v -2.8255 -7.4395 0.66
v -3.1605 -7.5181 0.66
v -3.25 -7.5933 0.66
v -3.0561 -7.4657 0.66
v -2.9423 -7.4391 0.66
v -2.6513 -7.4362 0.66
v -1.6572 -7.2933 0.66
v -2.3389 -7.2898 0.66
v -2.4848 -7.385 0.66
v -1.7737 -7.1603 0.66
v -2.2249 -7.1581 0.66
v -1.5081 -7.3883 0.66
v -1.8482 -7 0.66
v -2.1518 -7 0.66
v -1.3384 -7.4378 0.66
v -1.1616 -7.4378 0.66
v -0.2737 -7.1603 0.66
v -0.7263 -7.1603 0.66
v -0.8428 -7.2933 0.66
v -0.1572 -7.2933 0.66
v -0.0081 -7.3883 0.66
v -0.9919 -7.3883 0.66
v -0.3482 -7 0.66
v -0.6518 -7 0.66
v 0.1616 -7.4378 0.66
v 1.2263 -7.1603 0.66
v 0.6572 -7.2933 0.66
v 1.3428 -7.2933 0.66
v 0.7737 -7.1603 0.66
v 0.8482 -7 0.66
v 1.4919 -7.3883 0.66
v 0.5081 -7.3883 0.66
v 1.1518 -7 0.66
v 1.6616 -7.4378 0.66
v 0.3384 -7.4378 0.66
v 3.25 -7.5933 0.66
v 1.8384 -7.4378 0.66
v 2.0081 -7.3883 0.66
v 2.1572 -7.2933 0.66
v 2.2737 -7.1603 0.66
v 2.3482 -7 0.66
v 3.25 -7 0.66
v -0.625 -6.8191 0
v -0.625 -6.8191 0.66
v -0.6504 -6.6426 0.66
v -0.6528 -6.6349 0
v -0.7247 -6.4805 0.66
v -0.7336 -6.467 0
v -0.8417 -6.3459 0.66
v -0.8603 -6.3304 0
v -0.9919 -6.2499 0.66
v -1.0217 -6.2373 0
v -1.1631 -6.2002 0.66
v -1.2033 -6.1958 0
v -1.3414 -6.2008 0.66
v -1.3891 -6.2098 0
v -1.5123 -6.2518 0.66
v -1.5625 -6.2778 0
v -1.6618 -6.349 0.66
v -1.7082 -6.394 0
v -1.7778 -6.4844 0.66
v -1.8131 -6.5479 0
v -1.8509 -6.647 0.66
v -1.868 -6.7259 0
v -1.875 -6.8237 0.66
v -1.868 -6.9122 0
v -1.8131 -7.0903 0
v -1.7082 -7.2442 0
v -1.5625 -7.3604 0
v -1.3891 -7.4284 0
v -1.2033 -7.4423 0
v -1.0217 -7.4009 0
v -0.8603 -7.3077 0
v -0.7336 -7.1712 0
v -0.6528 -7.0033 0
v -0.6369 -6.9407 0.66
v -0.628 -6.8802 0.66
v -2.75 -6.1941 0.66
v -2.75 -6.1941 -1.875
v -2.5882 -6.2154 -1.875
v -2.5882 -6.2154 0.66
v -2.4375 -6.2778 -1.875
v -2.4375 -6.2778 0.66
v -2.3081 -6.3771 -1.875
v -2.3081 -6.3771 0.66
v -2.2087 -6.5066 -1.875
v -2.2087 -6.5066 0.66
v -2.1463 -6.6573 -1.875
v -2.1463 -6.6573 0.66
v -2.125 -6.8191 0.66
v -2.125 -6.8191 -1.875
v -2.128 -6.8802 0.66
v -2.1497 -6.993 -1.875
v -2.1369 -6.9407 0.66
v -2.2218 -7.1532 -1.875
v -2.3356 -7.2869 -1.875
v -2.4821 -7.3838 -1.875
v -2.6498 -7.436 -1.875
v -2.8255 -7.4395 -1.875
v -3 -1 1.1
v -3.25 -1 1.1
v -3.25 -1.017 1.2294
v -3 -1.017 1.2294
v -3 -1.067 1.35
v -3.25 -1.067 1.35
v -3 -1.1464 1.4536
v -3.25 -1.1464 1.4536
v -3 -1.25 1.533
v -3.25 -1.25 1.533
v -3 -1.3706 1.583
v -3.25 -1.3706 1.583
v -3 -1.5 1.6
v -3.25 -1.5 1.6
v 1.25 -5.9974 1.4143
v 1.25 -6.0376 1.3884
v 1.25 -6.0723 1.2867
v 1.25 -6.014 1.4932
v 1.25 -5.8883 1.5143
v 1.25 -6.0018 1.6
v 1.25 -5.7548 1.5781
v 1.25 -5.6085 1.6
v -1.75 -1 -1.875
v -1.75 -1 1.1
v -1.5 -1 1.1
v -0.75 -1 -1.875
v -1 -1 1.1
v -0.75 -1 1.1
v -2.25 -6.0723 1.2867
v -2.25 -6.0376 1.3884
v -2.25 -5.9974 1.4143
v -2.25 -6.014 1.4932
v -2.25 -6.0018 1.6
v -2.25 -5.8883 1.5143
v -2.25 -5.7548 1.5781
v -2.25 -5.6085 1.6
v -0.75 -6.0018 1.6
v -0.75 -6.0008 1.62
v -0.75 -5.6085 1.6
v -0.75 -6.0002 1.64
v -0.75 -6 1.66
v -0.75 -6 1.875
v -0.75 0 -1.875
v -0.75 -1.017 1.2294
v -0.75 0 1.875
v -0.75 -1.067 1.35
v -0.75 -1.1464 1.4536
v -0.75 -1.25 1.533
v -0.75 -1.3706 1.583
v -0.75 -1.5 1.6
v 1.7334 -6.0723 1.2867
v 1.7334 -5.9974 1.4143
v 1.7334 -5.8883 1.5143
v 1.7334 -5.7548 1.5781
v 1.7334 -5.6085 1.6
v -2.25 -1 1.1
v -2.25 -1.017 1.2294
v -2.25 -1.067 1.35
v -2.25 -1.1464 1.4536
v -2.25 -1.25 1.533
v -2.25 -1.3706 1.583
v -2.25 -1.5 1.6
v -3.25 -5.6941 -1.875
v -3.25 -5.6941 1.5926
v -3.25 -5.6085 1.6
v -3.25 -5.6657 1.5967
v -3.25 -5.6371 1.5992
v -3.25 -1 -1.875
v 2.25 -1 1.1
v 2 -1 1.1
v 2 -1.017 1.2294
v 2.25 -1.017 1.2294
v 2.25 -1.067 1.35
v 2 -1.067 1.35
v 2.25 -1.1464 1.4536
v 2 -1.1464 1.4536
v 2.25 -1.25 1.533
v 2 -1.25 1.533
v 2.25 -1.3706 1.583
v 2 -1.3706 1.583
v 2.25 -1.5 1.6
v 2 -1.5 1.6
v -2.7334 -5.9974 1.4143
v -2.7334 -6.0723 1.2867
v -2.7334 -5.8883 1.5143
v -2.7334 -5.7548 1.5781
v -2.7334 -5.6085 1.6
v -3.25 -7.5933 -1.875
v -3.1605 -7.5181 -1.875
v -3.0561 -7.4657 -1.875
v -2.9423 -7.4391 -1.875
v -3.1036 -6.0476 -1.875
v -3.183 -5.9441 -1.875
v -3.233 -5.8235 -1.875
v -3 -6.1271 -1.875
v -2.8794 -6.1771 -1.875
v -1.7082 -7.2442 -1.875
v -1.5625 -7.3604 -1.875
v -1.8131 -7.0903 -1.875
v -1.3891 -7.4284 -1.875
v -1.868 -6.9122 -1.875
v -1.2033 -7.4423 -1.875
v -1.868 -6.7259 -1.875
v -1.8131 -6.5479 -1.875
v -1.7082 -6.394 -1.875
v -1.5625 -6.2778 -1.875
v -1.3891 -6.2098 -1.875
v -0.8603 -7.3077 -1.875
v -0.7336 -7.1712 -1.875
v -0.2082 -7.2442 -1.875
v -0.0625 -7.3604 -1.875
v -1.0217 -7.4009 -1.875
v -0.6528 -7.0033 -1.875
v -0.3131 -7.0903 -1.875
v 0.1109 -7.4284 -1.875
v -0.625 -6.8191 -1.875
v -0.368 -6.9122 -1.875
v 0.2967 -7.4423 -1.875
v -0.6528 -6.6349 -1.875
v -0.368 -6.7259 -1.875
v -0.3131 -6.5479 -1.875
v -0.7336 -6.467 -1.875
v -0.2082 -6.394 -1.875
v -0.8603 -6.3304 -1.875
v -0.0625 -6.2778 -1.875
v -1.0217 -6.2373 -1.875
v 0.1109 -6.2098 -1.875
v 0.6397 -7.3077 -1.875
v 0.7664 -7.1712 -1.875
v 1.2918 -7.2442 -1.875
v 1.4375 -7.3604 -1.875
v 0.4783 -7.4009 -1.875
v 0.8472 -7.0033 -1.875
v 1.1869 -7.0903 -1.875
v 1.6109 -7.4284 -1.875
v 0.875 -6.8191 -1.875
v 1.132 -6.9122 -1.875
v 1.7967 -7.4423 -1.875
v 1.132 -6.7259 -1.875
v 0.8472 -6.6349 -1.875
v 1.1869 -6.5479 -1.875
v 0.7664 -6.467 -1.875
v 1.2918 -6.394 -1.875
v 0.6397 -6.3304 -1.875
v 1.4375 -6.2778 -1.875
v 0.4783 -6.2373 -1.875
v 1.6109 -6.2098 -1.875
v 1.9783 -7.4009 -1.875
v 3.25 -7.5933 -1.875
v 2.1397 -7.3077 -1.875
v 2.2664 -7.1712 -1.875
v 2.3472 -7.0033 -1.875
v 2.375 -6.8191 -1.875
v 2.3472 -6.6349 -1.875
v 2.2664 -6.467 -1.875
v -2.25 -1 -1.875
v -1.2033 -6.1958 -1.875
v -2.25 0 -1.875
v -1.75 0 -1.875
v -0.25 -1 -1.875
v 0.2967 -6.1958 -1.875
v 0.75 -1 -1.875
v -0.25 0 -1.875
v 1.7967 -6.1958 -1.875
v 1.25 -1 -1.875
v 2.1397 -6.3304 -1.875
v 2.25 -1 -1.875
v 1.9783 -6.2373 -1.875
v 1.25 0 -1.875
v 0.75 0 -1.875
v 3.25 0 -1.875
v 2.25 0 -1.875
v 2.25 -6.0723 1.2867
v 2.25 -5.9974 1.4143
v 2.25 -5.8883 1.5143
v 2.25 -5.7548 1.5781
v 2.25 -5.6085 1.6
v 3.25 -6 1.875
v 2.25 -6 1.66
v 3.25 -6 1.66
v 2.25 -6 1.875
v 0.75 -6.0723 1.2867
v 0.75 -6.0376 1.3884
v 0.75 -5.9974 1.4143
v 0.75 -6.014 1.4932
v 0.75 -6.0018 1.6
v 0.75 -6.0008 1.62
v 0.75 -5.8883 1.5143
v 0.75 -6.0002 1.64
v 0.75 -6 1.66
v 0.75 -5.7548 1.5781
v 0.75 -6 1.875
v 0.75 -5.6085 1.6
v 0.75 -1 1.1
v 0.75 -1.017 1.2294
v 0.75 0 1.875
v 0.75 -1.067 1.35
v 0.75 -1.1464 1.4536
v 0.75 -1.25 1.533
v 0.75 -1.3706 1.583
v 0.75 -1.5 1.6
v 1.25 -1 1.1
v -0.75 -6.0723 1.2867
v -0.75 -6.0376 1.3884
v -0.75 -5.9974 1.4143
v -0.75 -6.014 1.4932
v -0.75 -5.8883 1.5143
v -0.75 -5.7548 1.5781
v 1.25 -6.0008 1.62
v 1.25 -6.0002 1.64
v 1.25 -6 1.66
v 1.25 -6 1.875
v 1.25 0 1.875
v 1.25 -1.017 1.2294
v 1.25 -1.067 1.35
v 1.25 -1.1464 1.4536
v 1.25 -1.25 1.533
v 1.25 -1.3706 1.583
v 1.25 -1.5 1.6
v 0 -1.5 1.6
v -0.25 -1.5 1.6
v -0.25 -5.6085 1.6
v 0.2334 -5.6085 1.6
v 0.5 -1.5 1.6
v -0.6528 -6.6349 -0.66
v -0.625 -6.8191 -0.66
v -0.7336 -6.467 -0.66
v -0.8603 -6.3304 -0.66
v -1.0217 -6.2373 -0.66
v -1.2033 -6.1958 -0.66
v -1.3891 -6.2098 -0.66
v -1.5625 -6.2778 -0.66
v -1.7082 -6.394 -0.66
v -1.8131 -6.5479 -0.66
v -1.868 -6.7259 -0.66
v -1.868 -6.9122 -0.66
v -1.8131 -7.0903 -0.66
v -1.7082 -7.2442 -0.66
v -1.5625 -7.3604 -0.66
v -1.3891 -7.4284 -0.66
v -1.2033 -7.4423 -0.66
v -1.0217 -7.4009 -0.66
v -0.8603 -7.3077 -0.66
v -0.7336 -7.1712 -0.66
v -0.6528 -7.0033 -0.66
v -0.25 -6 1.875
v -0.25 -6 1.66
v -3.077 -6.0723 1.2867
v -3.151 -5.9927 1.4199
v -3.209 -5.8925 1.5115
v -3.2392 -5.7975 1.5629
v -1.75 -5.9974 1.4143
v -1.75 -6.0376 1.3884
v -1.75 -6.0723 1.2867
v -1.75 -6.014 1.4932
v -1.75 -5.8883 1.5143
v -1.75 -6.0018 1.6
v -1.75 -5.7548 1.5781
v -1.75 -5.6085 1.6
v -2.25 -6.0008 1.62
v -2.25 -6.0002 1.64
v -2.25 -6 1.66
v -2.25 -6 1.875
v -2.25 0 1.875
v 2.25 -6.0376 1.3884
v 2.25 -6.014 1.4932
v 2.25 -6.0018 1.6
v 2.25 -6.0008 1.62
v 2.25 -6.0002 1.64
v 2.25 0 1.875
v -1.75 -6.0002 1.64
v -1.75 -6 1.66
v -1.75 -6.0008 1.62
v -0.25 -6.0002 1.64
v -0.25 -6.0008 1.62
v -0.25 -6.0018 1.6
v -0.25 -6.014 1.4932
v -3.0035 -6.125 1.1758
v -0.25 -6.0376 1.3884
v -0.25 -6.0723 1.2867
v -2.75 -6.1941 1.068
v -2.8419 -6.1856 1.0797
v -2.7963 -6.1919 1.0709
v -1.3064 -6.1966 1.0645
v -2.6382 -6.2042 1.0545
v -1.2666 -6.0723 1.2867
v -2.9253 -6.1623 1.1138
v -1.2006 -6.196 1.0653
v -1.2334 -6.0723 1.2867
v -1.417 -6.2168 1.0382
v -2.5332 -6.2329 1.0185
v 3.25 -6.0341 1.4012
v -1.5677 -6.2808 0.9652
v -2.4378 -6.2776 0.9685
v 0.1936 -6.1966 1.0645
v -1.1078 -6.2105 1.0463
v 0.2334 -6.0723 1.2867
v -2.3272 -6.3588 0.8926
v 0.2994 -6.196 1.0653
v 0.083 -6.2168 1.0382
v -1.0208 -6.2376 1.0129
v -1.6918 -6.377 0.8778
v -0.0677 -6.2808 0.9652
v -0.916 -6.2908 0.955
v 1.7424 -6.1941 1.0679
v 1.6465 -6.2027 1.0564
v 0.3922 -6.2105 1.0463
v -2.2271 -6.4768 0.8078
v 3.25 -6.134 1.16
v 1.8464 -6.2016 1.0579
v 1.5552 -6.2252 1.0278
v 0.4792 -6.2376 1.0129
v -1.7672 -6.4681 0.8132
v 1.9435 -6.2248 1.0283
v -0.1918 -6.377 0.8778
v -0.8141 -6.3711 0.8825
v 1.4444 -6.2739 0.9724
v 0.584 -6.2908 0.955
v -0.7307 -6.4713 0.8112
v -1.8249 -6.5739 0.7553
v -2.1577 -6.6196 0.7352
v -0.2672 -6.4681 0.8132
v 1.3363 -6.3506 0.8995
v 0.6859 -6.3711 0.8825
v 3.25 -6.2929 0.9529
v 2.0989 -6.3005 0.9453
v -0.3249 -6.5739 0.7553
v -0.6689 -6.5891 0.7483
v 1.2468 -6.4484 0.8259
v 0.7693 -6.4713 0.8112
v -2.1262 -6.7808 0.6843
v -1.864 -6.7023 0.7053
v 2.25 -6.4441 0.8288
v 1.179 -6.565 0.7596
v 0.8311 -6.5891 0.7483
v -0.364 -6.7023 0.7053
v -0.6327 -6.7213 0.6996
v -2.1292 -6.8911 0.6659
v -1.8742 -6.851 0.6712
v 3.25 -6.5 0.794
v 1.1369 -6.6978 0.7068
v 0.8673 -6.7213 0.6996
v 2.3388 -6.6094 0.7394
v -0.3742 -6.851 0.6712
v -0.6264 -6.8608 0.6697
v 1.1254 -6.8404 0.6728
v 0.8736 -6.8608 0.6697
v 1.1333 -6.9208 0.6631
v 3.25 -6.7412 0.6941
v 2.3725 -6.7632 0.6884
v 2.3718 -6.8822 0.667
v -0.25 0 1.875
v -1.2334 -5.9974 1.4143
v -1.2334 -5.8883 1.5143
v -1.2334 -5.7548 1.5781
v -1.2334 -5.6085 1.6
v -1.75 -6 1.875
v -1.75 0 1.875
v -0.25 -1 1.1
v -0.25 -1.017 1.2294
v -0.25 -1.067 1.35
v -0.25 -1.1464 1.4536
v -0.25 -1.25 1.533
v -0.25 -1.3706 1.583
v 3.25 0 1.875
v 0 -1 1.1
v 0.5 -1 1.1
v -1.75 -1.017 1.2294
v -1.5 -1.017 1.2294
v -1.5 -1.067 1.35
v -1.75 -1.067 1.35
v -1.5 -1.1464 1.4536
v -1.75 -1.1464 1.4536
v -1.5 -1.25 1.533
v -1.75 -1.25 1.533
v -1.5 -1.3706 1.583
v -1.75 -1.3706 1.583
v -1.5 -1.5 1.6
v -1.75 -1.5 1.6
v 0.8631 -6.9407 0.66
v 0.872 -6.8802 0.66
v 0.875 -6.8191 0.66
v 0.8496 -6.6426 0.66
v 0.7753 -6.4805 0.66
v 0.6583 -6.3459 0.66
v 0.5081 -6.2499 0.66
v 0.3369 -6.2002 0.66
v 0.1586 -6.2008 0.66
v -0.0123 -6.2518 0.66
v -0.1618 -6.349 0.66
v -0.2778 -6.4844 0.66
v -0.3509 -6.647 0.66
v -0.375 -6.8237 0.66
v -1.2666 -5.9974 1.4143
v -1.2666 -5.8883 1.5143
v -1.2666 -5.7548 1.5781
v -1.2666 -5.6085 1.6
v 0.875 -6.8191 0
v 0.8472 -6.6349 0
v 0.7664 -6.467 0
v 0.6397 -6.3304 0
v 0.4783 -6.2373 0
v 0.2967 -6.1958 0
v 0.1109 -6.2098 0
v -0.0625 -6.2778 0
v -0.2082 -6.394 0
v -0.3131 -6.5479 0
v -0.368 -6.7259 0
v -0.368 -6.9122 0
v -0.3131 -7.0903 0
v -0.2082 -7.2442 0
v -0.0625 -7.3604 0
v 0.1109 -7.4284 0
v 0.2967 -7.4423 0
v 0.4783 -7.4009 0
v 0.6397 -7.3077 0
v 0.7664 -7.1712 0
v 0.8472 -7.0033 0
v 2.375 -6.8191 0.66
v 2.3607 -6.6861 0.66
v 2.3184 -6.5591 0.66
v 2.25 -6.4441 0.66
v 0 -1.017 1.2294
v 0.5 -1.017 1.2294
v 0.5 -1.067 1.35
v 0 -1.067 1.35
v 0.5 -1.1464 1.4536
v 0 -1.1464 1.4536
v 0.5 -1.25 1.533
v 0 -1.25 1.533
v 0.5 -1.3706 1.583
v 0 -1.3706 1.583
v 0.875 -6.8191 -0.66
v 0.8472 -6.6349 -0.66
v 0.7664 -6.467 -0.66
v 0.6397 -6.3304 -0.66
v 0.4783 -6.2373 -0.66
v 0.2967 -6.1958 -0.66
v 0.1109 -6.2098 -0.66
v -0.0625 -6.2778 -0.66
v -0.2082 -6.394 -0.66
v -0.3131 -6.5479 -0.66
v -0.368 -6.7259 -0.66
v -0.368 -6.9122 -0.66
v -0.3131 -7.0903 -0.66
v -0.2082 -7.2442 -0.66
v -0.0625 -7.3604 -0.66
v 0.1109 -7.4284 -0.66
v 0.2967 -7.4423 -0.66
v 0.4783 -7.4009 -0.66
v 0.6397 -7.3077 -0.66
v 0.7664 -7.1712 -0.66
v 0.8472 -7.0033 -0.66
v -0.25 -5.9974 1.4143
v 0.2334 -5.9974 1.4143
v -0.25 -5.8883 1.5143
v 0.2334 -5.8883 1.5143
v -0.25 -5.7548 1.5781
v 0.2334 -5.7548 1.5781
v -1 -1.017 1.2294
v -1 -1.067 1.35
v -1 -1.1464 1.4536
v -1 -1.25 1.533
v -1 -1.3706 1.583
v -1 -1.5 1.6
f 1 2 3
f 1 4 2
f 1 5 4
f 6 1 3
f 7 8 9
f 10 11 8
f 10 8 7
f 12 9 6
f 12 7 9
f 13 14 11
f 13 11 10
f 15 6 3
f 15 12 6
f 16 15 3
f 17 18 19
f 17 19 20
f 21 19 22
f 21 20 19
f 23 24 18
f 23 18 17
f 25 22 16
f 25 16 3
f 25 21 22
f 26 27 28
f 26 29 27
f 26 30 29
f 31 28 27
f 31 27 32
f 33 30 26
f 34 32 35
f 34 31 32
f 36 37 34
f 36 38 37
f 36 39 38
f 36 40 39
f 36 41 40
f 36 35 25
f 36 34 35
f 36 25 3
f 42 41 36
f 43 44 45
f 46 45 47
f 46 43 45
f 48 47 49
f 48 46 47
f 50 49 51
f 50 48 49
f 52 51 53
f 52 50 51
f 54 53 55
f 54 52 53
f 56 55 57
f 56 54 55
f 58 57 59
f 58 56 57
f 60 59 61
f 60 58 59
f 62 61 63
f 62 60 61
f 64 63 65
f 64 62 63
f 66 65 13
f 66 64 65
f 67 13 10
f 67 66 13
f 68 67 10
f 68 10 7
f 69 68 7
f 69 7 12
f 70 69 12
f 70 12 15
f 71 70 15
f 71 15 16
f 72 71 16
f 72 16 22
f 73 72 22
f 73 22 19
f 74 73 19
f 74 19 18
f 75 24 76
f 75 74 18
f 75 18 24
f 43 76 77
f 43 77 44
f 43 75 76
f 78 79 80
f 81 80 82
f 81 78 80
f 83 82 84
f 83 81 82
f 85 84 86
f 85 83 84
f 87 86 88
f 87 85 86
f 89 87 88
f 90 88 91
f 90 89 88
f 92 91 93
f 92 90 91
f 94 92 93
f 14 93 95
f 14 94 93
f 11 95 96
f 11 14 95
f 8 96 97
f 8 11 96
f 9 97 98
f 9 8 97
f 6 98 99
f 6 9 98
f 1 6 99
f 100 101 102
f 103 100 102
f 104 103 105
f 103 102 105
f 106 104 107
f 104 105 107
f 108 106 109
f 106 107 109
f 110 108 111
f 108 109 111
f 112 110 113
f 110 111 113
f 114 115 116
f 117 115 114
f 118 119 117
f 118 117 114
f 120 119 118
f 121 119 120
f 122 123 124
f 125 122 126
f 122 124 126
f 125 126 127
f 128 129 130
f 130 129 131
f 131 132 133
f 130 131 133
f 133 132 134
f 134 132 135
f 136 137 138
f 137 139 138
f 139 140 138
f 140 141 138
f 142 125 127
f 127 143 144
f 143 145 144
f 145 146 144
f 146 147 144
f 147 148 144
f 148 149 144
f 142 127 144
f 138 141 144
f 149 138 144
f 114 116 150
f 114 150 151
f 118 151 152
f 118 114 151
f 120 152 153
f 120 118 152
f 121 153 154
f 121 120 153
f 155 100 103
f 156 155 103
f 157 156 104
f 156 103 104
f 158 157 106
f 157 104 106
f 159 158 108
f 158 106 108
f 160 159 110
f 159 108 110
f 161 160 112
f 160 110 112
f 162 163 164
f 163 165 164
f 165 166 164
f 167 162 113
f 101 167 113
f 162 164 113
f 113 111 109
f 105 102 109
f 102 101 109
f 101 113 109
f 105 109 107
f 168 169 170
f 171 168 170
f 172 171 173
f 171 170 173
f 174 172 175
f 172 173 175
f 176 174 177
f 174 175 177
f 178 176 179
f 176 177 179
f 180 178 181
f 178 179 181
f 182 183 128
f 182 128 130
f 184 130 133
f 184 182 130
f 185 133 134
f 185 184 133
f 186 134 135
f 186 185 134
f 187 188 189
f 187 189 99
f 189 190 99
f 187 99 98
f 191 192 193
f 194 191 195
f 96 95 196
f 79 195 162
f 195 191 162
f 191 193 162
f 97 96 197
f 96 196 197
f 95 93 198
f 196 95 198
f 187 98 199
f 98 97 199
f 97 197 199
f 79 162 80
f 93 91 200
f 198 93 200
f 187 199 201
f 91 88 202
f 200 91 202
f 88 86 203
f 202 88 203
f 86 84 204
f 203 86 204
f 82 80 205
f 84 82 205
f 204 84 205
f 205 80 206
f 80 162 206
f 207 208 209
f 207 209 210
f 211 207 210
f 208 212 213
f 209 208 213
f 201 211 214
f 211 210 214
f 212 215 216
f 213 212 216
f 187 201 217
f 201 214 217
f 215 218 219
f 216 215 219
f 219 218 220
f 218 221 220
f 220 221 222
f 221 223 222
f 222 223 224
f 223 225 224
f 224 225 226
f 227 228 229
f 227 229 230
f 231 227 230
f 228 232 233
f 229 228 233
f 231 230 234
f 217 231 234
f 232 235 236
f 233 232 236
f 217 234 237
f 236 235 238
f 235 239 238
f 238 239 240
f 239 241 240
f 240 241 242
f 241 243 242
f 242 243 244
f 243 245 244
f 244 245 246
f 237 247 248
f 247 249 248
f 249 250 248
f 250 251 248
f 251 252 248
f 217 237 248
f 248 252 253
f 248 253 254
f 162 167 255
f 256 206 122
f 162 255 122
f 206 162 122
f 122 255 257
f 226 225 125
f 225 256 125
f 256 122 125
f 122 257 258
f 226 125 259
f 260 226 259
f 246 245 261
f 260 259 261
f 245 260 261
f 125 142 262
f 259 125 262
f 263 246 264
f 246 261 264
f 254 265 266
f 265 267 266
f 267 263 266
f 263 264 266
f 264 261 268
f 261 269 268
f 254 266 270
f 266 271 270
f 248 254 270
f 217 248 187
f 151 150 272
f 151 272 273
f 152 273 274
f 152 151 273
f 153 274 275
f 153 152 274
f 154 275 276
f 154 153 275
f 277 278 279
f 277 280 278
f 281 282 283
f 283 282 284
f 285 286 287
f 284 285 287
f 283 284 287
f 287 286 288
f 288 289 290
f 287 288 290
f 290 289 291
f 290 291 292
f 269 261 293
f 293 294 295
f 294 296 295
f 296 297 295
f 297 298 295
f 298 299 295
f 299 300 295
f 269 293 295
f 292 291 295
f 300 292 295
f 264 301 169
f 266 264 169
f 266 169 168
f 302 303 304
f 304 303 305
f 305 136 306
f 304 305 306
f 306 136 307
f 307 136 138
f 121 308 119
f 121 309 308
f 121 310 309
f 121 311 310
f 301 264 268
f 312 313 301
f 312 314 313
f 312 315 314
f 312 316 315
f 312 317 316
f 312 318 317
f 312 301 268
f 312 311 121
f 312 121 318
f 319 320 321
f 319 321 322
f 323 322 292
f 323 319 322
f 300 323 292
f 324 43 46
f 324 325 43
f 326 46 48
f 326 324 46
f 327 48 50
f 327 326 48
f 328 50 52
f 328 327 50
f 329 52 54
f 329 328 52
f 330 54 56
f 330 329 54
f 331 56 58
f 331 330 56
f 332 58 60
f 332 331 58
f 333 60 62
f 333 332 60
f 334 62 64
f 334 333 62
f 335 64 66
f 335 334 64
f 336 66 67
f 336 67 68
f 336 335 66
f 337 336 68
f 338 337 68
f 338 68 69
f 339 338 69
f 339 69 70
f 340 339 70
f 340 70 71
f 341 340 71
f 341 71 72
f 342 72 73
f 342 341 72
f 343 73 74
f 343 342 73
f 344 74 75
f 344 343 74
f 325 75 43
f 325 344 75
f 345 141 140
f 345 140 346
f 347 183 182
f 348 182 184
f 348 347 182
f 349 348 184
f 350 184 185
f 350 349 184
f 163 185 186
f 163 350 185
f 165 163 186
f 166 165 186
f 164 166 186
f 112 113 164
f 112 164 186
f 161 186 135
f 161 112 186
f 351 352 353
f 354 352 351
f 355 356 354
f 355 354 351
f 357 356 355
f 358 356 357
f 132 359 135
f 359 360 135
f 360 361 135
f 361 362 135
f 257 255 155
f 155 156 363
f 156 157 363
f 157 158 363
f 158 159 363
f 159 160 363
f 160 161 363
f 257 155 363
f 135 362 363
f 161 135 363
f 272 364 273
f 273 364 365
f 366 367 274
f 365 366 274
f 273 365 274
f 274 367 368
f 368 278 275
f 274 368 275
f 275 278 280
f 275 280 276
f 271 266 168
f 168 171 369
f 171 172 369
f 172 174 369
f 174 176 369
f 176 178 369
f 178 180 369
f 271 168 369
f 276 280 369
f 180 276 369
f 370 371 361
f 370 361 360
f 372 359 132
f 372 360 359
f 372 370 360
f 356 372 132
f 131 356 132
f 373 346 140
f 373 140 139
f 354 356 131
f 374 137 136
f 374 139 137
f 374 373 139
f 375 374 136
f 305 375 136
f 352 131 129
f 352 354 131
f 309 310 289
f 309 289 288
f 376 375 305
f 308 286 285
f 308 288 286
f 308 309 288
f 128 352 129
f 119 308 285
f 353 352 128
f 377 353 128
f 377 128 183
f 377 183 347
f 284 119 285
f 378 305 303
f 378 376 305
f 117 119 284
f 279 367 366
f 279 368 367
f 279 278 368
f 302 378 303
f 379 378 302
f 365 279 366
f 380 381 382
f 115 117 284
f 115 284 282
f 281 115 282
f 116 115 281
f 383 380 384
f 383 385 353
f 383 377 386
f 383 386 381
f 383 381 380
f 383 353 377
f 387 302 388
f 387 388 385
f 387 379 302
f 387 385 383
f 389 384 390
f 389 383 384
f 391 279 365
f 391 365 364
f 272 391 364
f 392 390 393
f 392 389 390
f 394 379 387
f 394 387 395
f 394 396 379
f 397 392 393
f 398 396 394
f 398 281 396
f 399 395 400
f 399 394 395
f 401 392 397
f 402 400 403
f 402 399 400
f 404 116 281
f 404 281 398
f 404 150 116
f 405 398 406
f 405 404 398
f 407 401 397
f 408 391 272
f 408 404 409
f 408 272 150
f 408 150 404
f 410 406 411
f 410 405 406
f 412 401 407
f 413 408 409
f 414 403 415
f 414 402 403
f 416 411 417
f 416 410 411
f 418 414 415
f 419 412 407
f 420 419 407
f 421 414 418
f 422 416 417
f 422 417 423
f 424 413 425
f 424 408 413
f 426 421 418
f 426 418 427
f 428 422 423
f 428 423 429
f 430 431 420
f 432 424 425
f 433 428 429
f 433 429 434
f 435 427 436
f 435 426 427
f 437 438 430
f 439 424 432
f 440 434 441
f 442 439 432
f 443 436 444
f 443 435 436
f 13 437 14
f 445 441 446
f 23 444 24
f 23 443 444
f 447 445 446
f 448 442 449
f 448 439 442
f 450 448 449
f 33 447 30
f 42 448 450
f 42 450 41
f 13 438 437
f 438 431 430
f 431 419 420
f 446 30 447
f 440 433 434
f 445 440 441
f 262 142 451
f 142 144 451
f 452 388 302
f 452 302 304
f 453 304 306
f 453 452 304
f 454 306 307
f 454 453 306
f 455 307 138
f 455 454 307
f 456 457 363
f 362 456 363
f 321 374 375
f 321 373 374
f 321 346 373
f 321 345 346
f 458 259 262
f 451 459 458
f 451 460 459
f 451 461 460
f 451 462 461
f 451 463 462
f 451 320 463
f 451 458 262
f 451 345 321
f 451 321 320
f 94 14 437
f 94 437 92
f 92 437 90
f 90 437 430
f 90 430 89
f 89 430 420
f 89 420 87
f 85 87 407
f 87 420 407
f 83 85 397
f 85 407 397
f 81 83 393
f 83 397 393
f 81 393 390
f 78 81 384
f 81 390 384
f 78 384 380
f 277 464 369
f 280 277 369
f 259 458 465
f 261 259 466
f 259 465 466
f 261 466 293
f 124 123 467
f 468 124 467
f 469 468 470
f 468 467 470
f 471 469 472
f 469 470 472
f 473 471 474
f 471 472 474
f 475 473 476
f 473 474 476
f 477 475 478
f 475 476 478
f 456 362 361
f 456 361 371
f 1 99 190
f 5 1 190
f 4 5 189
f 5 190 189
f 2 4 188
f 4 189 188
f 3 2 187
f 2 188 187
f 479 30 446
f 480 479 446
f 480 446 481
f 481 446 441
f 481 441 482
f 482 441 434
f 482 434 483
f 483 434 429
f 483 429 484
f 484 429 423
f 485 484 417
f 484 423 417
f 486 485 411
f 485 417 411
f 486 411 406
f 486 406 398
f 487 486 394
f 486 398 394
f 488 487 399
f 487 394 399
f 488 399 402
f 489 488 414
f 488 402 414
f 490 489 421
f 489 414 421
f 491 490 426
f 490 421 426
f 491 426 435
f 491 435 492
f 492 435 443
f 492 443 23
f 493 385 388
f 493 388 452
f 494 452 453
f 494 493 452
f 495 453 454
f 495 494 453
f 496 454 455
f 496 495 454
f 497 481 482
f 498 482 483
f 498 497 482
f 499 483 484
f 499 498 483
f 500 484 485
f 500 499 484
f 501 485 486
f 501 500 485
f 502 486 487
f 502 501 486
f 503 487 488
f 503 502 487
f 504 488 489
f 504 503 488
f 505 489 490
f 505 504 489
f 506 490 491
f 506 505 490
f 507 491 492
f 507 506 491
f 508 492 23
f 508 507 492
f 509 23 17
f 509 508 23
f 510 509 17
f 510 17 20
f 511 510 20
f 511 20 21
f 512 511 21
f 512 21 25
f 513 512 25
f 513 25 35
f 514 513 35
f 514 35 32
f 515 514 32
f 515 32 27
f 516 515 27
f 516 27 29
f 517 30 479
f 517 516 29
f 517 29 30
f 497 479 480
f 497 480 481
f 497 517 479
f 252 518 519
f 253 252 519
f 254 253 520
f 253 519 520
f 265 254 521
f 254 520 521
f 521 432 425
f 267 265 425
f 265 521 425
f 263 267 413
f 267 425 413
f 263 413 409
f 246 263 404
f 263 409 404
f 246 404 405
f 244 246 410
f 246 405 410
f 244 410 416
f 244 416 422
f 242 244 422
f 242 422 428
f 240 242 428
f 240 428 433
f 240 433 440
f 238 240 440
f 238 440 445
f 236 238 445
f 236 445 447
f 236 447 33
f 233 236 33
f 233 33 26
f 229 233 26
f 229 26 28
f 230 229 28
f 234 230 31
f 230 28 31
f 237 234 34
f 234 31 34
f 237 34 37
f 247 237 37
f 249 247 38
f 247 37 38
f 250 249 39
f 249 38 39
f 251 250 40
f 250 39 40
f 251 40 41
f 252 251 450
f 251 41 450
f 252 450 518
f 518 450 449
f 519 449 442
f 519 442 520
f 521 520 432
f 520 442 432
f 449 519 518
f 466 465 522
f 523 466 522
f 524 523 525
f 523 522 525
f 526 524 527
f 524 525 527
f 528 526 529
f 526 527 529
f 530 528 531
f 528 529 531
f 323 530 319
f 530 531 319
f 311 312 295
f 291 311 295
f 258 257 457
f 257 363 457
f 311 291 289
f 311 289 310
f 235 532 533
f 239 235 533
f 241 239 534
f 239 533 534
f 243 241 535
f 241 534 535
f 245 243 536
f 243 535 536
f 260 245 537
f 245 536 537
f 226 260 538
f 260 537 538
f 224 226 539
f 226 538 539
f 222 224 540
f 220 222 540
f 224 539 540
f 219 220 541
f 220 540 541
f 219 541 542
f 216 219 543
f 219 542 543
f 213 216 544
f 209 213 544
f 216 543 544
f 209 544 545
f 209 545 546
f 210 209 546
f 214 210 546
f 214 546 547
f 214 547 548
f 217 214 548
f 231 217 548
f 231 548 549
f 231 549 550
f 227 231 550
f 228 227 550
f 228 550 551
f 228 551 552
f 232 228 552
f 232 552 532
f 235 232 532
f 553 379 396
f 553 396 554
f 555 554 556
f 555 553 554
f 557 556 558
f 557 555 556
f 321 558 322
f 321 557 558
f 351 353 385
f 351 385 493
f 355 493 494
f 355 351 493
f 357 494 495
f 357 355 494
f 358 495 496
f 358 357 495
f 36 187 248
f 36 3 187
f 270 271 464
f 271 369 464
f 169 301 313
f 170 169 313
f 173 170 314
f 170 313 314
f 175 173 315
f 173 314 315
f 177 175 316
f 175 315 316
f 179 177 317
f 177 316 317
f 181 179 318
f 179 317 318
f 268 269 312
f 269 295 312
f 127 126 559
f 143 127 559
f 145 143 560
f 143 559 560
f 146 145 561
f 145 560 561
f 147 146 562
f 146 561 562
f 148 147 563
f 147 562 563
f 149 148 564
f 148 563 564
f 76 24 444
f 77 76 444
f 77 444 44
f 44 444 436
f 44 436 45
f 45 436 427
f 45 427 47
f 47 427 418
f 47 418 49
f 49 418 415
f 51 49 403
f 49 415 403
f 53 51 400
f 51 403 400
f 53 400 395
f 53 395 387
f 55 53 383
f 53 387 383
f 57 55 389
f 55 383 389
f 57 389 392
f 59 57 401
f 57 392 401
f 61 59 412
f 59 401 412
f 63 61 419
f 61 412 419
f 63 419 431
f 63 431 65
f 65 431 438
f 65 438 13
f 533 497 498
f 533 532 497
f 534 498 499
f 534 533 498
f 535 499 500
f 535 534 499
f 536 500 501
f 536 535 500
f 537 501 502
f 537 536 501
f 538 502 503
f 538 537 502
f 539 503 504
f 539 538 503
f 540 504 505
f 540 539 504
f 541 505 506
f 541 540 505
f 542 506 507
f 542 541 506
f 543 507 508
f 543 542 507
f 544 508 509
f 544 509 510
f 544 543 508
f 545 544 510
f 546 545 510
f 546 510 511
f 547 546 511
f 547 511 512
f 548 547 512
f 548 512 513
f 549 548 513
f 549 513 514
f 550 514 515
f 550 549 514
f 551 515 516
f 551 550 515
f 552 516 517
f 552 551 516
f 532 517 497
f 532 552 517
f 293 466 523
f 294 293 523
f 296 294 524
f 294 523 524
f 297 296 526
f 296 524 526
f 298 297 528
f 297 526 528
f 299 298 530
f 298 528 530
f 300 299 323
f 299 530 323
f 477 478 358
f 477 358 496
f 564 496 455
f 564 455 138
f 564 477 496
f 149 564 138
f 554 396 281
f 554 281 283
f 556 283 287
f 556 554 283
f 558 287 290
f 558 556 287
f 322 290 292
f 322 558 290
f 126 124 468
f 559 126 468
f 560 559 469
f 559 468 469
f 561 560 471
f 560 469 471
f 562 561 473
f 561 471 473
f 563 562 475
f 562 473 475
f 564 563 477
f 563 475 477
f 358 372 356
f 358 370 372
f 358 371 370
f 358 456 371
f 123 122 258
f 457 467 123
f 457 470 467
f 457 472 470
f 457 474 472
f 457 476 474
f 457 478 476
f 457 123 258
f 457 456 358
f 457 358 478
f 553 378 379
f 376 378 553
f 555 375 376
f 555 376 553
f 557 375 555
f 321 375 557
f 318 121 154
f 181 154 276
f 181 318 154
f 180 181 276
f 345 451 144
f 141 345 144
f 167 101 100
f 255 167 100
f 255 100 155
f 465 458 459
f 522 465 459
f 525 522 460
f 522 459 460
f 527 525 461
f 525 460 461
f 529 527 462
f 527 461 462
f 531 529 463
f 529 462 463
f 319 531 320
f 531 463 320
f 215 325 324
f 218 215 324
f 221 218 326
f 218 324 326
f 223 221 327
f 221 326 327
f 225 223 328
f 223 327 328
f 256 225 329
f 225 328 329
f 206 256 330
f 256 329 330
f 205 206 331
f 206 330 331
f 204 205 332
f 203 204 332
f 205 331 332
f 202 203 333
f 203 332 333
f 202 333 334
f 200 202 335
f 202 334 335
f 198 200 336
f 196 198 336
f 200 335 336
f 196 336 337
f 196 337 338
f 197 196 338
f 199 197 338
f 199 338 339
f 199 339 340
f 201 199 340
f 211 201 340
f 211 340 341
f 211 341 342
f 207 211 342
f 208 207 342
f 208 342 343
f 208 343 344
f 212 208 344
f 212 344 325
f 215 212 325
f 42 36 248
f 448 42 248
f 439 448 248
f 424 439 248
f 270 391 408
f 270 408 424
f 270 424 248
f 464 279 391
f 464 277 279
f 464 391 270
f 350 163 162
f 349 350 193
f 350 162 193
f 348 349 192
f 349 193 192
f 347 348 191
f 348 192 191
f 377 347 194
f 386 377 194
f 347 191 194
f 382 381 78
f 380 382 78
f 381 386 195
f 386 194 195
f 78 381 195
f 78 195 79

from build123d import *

# Parameters (mm, degrees)
F0_W         = 1
F0_H         = 3.475
F1_DEPTH     = 6
F2_DEPTH     = 1
F3_R         = 0.625
F4_DEPTH     = 0.66
F5_DEPTH     = 1.875
F6_T4_DEPTH  = 9
F6_S6_R      = 0.625
F6_T7_DEPTH  = 6
F6_T11_DEPTH = 9
F6_S14_R     = 0.625
F6_T15_DEPTH = 6
F6_S16_R     = 0.625
F6_T17_DEPTH = 6
F6_S18_R     = 0.625
F6_T19_DEPTH = 6
F6_S20_R     = 0.625
F6_T21_DEPTH = 6
F6_T25_DEPTH = 11.5
F6_T32_DEPTH = 11.5
F6_T39_DEPTH = 11.5
F7_T1_DEPTH  = 6.4537585313
F7_T3_DEPTH  = 4.9869031288
F7_T5_DEPTH  = 1
F7_T7_DEPTH  = 1
F7_T9_DEPTH  = 1
F7_T11_DEPTH = 2.25
F7_T13_DEPTH = 1.9833688147
F7_T18_DEPTH = 3.5
F7_T23_DEPTH = 3.5
F7_T28_DEPTH = 3.5
F7_T33_DEPTH = 3.5
F7_T38_DEPTH = 3.5
F7_T43_DEPTH = 3.5
F7_T48_DEPTH = 2.9667376294
F7_T53_DEPTH = 2.9667376294
F7_T58_DEPTH = 2.9667376294
F7_T63_DEPTH = 2.9667376294
F7_T68_DEPTH = 2.9667376294
F7_T73_DEPTH = 2.9667376294


# Not quite as in the source:
# - a fillet or chamfer that OpenCascade refuses, or shapes differently, is made with other operations: its cross-section is extruded or revolved along the edge and cut away or added


with BuildPart() as f1:
    # F0 (on Front) → F1 (new body)
    with BuildSketch(Plane.XZ):
        Polygon((2.25, -1.875), (3.25, -1.875), (3.25, 1.875), (2.25, 1.875), (2.25, 1.6), align=None)
        with Locations((1.75, -0.1375)):
            Rectangle(F0_W, F0_H)
        Polygon((0.75, -1.875), (1.25, -1.875), (1.25, 1.6), (1.25, 1.875), (0.75, 1.875), (0.75, 1.6), align=None)
        with Locations((0.25, -0.1375)):
            Rectangle(F0_W, F0_H)
        Polygon((-0.75, -1.875), (-0.25, -1.875), (-0.25, 1.6), (-0.25, 1.875), (-0.75, 1.875), (-0.75, 1.6), align=None)
        with Locations((-1.25, -0.1375)):
            Rectangle(F0_W, F0_H)
        Polygon((-2.25, -1.875), (-1.75, -1.875), (-1.75, 1.6), (-1.75, 1.875), (-2.25, 1.875), (-2.25, 1.6), align=None)
        with Locations((-2.75, -0.1375)):
            Rectangle(F0_W, F0_H)
    extrude(amount=F1_DEPTH)

    # F0 (on Front) → F2 (cut)
    with BuildSketch(Plane.XZ):
        with Locations((1.75, -0.1375)):
            Rectangle(F0_W, F0_H)
        with Locations((0.25, -0.1375)):
            Rectangle(F0_W, F0_H)
        with Locations((-1.25, -0.1375)):
            Rectangle(F0_W, F0_H)
        with Locations((-2.75, -0.1375)):
            Rectangle(F0_W, F0_H)
    extrude(amount=F2_DEPTH, mode=Mode.SUBTRACT)

    # F3 (on Top) → F4 (join, symmetric)
    with BuildSketch(Plane.XY):
        with BuildLine():
            Line((3.25, -6), (-3.25, -6))
            Line((-3.25, -6), (-3.25, -6.4440884776))
            ThreePointArc((-3.25, -6.4440884776), (-2.5523576462, -6.2261614164), (-2.125, -6.8190884776))
            ThreePointArc((-2.125, -6.8190884776), (-2.5523576462, -7.4120155389), (-3.25, -7.1940884776))
            Line((-3.25, -7.1940884776), (-3.25, -7.593262475))
            Line((-3.25, -7.593262475), (3.25, -7.593262475))
            Line((3.25, -7.593262475), (3.25, -6))
        make_face()
        with Locations((-1.25, -6.8190884776)):
            Circle(F3_R, mode=Mode.SUBTRACT)
        with Locations((0.25, -6.8190884776)):
            Circle(F3_R, mode=Mode.SUBTRACT)
        with Locations((1.75, -6.8190884776)):
            Circle(F3_R, mode=Mode.SUBTRACT)
    extrude(amount=F4_DEPTH, both=True)

    # F3 (on Top) → F5 (join)
    with BuildSketch(Plane.XY):
        with BuildLine():
            Line((3.25, -6), (-3.25, -6))
            Line((-3.25, -6), (-3.25, -6.4440884776))
            ThreePointArc((-3.25, -6.4440884776), (-2.5523576462, -6.2261614164), (-2.125, -6.8190884776))
            ThreePointArc((-2.125, -6.8190884776), (-2.5523576462, -7.4120155389), (-3.25, -7.1940884776))
            Line((-3.25, -7.1940884776), (-3.25, -7.593262475))
            Line((-3.25, -7.593262475), (3.25, -7.593262475))
            Line((3.25, -7.593262475), (3.25, -6))
        make_face()
        with Locations((-1.25, -6.8190884776)):
            Circle(F3_R, mode=Mode.SUBTRACT)
        with Locations((0.25, -6.8190884776)):
            Circle(F3_R, mode=Mode.SUBTRACT)
        with Locations((1.75, -6.8190884776)):
            Circle(F3_R, mode=Mode.SUBTRACT)
    extrude(amount=-F5_DEPTH)

    # F6: fillet of radius 1 on 1 edges, made by hand


with BuildPart() as f6_tool2:
    # F6_s3 → F6_t4 (new body)
    with BuildSketch(Plane.YZ.offset(3.25)):
        with BuildLine():
            ThreePointArc((-6, 1.66), (-6.2928932188, 0.9528932188), (-7, 0.66))
            Line((-7, 0.66), (-6, 0.66))
            Line((-6, 0.66), (-6, 1.66))
        make_face()
    extrude(amount=-F6_T4_DEPTH)

    split(bisect_by=Plane.YZ.offset(2.25), keep=Keep.TOP)

    # F6_s6 → F6_t7 (cut, symmetric)
    with BuildSketch(Plane.XY.offset(1.2)):
        with Locations((1.75, -6.8190884776)):
            Circle(F6_S6_R)
    extrude(amount=F6_T7_DEPTH, both=True, mode=Mode.SUBTRACT)


with BuildPart() as f1_1:
    add(f1.part)

    # F6_t1: union F6_tool2
    add(f6_tool2.part)


with BuildPart() as f6_tool9:
    # F6_s10 → F6_t11 (new body)
    with BuildSketch(Plane.YZ.offset(5.75)):
        with BuildLine():
            ThreePointArc((-6, 1.66), (-6.2928932188, 0.9528932188), (-7, 0.66))
            Line((-7, 0.66), (-6, 0.66))
            Line((-6, 0.66), (-6, 1.66))
        make_face()
    extrude(amount=-F6_T11_DEPTH)

    split(bisect_by=Plane.YZ.offset(2.25), keep=Keep.BOTTOM)

    split(bisect_by=Plane.XY.offset(1.6), keep=Keep.BOTTOM)

    # F6_s14 → F6_t15 (cut, symmetric)
    with BuildSketch(Plane.XY.offset(1.2)):
        with Locations((-2.75, -6.8190884776)):
            Circle(F6_S14_R)
    extrude(amount=F6_T15_DEPTH, both=True, mode=Mode.SUBTRACT)

    # F6_s16 → F6_t17 (cut, symmetric)
    with BuildSketch(Plane.XY.offset(1.2)):
        with Locations((1.75, -6.8190884776)):
            Circle(F6_S16_R)
    extrude(amount=F6_T17_DEPTH, both=True, mode=Mode.SUBTRACT)

    # F6_s18 → F6_t19 (cut, symmetric)
    with BuildSketch(Plane.XY.offset(1.2)):
        with Locations((0.25, -6.8190884776)):
            Circle(F6_S18_R)
    extrude(amount=F6_T19_DEPTH, both=True, mode=Mode.SUBTRACT)

    # F6_s20 → F6_t21 (cut, symmetric)
    with BuildSketch(Plane.XY.offset(1.2)):
        with Locations((-1.25, -6.8190884776)):
            Circle(F6_S20_R)
    extrude(amount=F6_T21_DEPTH, both=True, mode=Mode.SUBTRACT)


with BuildPart() as f1_2:
    add(f1_1.part)

    # F6_t8: union F6_tool9
    add(f6_tool9.part)


with BuildPart() as f6_tool23:
    # F6_s24 → F6_t25 (new body)
    with BuildSketch(Plane.YZ.offset(5.75)):
        with BuildLine():
            ThreePointArc((-6, 1.66), (-6.2928932188, 0.9528932188), (-7, 0.66))
            Line((-7, 0.66), (-6, 0.66))
            Line((-6, 0.66), (-6, 1.66))
        make_face()
    extrude(amount=-F6_T25_DEPTH)

    split(bisect_by=Plane.XY.offset(1.6), keep=Keep.TOP)

    split(bisect_by=Plane.YZ.offset(1.25), keep=Keep.BOTTOM)

    split(bisect_by=Plane.YZ.offset(0.75), keep=Keep.TOP)


with BuildPart() as f1_3:
    add(f1_2.part)

    # F6_t22: union F6_tool23
    add(f6_tool23.part)


with BuildPart() as f6_tool30:
    # F6_s31 → F6_t32 (new body)
    with BuildSketch(Plane.YZ.offset(5.75)):
        with BuildLine():
            ThreePointArc((-6, 1.66), (-6.2928932188, 0.9528932188), (-7, 0.66))
            Line((-7, 0.66), (-6, 0.66))
            Line((-6, 0.66), (-6, 1.66))
        make_face()
    extrude(amount=-F6_T32_DEPTH)

    split(bisect_by=Plane.XY.offset(1.6), keep=Keep.TOP)

    split(bisect_by=Plane.YZ.offset(-0.25), keep=Keep.BOTTOM)

    split(bisect_by=Plane.YZ.offset(-0.75), keep=Keep.TOP)


with BuildPart() as f1_4:
    add(f1_3.part)

    # F6_t29: union F6_tool30
    add(f6_tool30.part)


with BuildPart() as f6_tool37:
    # F6_s38 → F6_t39 (new body)
    with BuildSketch(Plane.YZ.offset(5.75)):
        with BuildLine():
            ThreePointArc((-6, 1.66), (-6.2928932188, 0.9528932188), (-7, 0.66))
            Line((-7, 0.66), (-6, 0.66))
            Line((-6, 0.66), (-6, 1.66))
        make_face()
    extrude(amount=-F6_T39_DEPTH)

    split(bisect_by=Plane.XY.offset(1.6), keep=Keep.TOP)

    split(bisect_by=Plane.YZ.offset(-1.75), keep=Keep.BOTTOM)

    split(bisect_by=Plane.YZ.offset(-2.25), keep=Keep.TOP)


with BuildPart() as f1_5:
    add(f1_4.part)

    # F6_t36: union F6_tool37
    add(f6_tool37.part)

    # F7: fillet of radius 0.5 on 10 edges, made by hand

    # F7_s2 → F7_t1 (cut)
    with BuildSketch(Plane.XY.offset(-3.75)):
        with BuildLine():
            ThreePointArc((-3.25, -5.6940884776), (-3.1035533906, -6.0476418682), (-2.75, -6.1940884776))
            ThreePointArc((-2.75, -6.1940884776), (-3.0295084972, -6.2600714833), (-3.25, -6.4440884776))
            Line((-3.25, -6.4440884776), (-3.25, -5.6940884776))
        make_face()
    extrude(amount=F7_T1_DEPTH, mode=Mode.SUBTRACT)

    # F7_s4 → F7_t3 (cut)
    with BuildSketch(Plane.XY.offset(-3.1009515644)):
        with BuildLine():
            ThreePointArc((-2.8254555009, -7.4395169323), (-3.0560709442, -7.4657378156), (-3.25, -7.593262475))
            Line((-3.25, -7.593262475), (-3.25, -7.1940884776))
            ThreePointArc((-3.25, -7.1940884776), (-3.0628035165, -7.3601790061), (-2.8254555009, -7.4395169323))
        make_face()
    extrude(amount=F7_T3_DEPTH, mode=Mode.SUBTRACT)

    # F7_s6 → F7_t5 (cut)
    with BuildSketch(Plane.YZ.offset(1.25)):
        with BuildLine():
            ThreePointArc((-1, 1.1), (-1.1464466094, 1.4535533906), (-1.5, 1.6))
            Line((-1.5, 1.6), (-1, 1.6))
            Line((-1, 1.6), (-1, 1.1))
        make_face()
        with BuildLine():
            ThreePointArc((-6.0723027314, 1.2866666667), (-5.8883350241, 1.5143267632), (-5.608454097, 1.6))
            Line((-5.608454097, 1.6), (-6.0018016229, 1.6))
            ThreePointArc((-6.0018016229, 1.6), (-6.024390983, 1.4404845199), (-6.0723027314, 1.2866666667))
        make_face()
    extrude(amount=F7_T5_DEPTH, mode=Mode.SUBTRACT)

    # F7_s8 → F7_t7 (cut)
    with BuildSketch(Plane.YZ.offset(-0.25)):
        with BuildLine():
            ThreePointArc((-1, 1.1), (-1.1464466094, 1.4535533906), (-1.5, 1.6))
            Line((-1.5, 1.6), (-1, 1.6))
            Line((-1, 1.6), (-1, 1.1))
        make_face()
        with BuildLine():
            ThreePointArc((-6.0723027314, 1.2866666667), (-5.8883350241, 1.5143267632), (-5.608454097, 1.6))
            Line((-5.608454097, 1.6), (-6.0018016229, 1.6))
            ThreePointArc((-6.0018016229, 1.6), (-6.024390983, 1.4404845199), (-6.0723027314, 1.2866666667))
        make_face()
    extrude(amount=F7_T7_DEPTH, mode=Mode.SUBTRACT)

    # F7_s10 → F7_t9 (cut)
    with BuildSketch(Plane.YZ.offset(-1.75)):
        with BuildLine():
            ThreePointArc((-1, 1.1), (-1.1464466094, 1.4535533906), (-1.5, 1.6))
            Line((-1.5, 1.6), (-1, 1.6))
            Line((-1, 1.6), (-1, 1.1))
        make_face()
        with BuildLine():
            ThreePointArc((-6.0723027314, 1.2866666667), (-5.8883350241, 1.5143267632), (-5.608454097, 1.6))
            Line((-5.608454097, 1.6), (-6.0018016229, 1.6))
            ThreePointArc((-6.0018016229, 1.6), (-6.024390983, 1.4404845199), (-6.0723027314, 1.2866666667))
        make_face()
    extrude(amount=F7_T9_DEPTH, mode=Mode.SUBTRACT)

    # F7_s12 → F7_t11 (cut)
    with BuildSketch(Plane.YZ.offset(-4.5)):
        with BuildLine():
            ThreePointArc((-1, 1.1), (-1.1464466094, 1.4535533906), (-1.5, 1.6))
            Line((-1.5, 1.6), (-1, 1.6))
            Line((-1, 1.6), (-1, 1.1))
        make_face()
    extrude(amount=F7_T11_DEPTH, mode=Mode.SUBTRACT)

    # F7_s14 → F7_t13 (cut)
    with BuildSketch(Plane.YZ.offset(-4.2333688147)):
        with BuildLine():
            ThreePointArc((-6.0723027314, 1.2866666667), (-5.8883350241, 1.5143267632), (-5.608454097, 1.6))
            Line((-5.608454097, 1.6), (-6.0018016229, 1.6))
            ThreePointArc((-6.0018016229, 1.6), (-6.024390983, 1.4404845199), (-6.0723027314, 1.2866666667))
        make_face()
    extrude(amount=F7_T13_DEPTH, mode=Mode.SUBTRACT)


with BuildPart() as f7_tool16:
    # F7_s17 → F7_t18 (new body)
    with BuildSketch(Plane.YZ.offset(3.5)):
        with BuildLine():
            ThreePointArc((-1, 1.1), (-1.1464466094, 1.4535533906), (-1.5, 1.6))
            Line((-1.5, 1.6), (-1, 1.6))
            Line((-1, 1.6), (-1, 1.1))
        make_face()
    extrude(amount=-F7_T18_DEPTH)

    split(bisect_by=Plane.YZ.offset(0.75), keep=Keep.BOTTOM)


with BuildPart() as f1_6:
    add(f1_5.part)

    # F7_t15: cut F7_tool16
    add(f7_tool16.part, mode=Mode.SUBTRACT)


with BuildPart() as f7_tool21:
    # F7_s22 → F7_t23 (new body)
    with BuildSketch(Plane.YZ.offset(2)):
        with BuildLine():
            ThreePointArc((-1, 1.1), (-1.1464466094, 1.4535533906), (-1.5, 1.6))
            Line((-1.5, 1.6), (-1, 1.6))
            Line((-1, 1.6), (-1, 1.1))
        make_face()
    extrude(amount=-F7_T23_DEPTH)

    split(bisect_by=Plane.YZ.offset(1.25), keep=Keep.TOP)


with BuildPart() as f1_7:
    add(f1_6.part)

    # F7_t20: cut F7_tool21
    add(f7_tool21.part, mode=Mode.SUBTRACT)


with BuildPart() as f7_tool26:
    # F7_s27 → F7_t28 (new body)
    with BuildSketch(Plane.YZ.offset(2)):
        with BuildLine():
            ThreePointArc((-1, 1.1), (-1.1464466094, 1.4535533906), (-1.5, 1.6))
            Line((-1.5, 1.6), (-1, 1.6))
            Line((-1, 1.6), (-1, 1.1))
        make_face()
    extrude(amount=-F7_T28_DEPTH)

    split(bisect_by=Plane.YZ.offset(-0.75), keep=Keep.BOTTOM)


with BuildPart() as f1_8:
    add(f1_7.part)

    # F7_t25: cut F7_tool26
    add(f7_tool26.part, mode=Mode.SUBTRACT)


with BuildPart() as f7_tool31:
    # F7_s32 → F7_t33 (new body)
    with BuildSketch(Plane.YZ.offset(0.5)):
        with BuildLine():
            ThreePointArc((-1, 1.1), (-1.1464466094, 1.4535533906), (-1.5, 1.6))
            Line((-1.5, 1.6), (-1, 1.6))
            Line((-1, 1.6), (-1, 1.1))
        make_face()
    extrude(amount=-F7_T33_DEPTH)

    split(bisect_by=Plane.YZ.offset(-0.25), keep=Keep.TOP)


with BuildPart() as f1_9:
    add(f1_8.part)

    # F7_t30: cut F7_tool31
    add(f7_tool31.part, mode=Mode.SUBTRACT)


with BuildPart() as f7_tool36:
    # F7_s37 → F7_t38 (new body)
    with BuildSketch(Plane.YZ.offset(0.5)):
        with BuildLine():
            ThreePointArc((-1, 1.1), (-1.1464466094, 1.4535533906), (-1.5, 1.6))
            Line((-1.5, 1.6), (-1, 1.6))
            Line((-1, 1.6), (-1, 1.1))
        make_face()
    extrude(amount=-F7_T38_DEPTH)

    split(bisect_by=Plane.YZ.offset(-2.25), keep=Keep.BOTTOM)


with BuildPart() as f1_10:
    add(f1_9.part)

    # F7_t35: cut F7_tool36
    add(f7_tool36.part, mode=Mode.SUBTRACT)


with BuildPart() as f7_tool41:
    # F7_s42 → F7_t43 (new body)
    with BuildSketch(Plane.YZ.offset(-1)):
        with BuildLine():
            ThreePointArc((-1, 1.1), (-1.1464466094, 1.4535533906), (-1.5, 1.6))
            Line((-1.5, 1.6), (-1, 1.6))
            Line((-1, 1.6), (-1, 1.1))
        make_face()
    extrude(amount=-F7_T43_DEPTH)

    split(bisect_by=Plane.YZ.offset(-1.75), keep=Keep.TOP)


with BuildPart() as f1_11:
    add(f1_10.part)

    # F7_t40: cut F7_tool41
    add(f7_tool41.part, mode=Mode.SUBTRACT)


with BuildPart() as f7_tool46:
    # F7_s47 → F7_t48 (new body)
    with BuildSketch(Plane.YZ.offset(0.2666311853)):
        with BuildLine():
            ThreePointArc((-6.0723027314, 1.2866666667), (-5.8883350241, 1.5143267632), (-5.608454097, 1.6))
            Line((-5.608454097, 1.6), (-6.0018016229, 1.6))
            ThreePointArc((-6.0018016229, 1.6), (-6.024390983, 1.4404845199), (-6.0723027314, 1.2866666667))
        make_face()
    extrude(amount=F7_T48_DEPTH)

    split(bisect_by=Plane.YZ.offset(0.75), keep=Keep.BOTTOM)


with BuildPart() as f1_12:
    add(f1_11.part)

    # F7_t45: cut F7_tool46
    add(f7_tool46.part, mode=Mode.SUBTRACT)


with BuildPart() as f7_tool51:
    # F7_s52 → F7_t53 (new body)
    with BuildSketch(Plane.YZ.offset(-1.2333688147)):
        with BuildLine():
            ThreePointArc((-6.0723027314, 1.2866666667), (-5.8883350241, 1.5143267632), (-5.608454097, 1.6))
            Line((-5.608454097, 1.6), (-6.0018016229, 1.6))
            ThreePointArc((-6.0018016229, 1.6), (-6.024390983, 1.4404845199), (-6.0723027314, 1.2866666667))
        make_face()
    extrude(amount=F7_T53_DEPTH)

    split(bisect_by=Plane.YZ.offset(-0.75), keep=Keep.BOTTOM)


with BuildPart() as f1_13:
    add(f1_12.part)

    # F7_t50: cut F7_tool51
    add(f7_tool51.part, mode=Mode.SUBTRACT)


with BuildPart() as f7_tool56:
    # F7_s57 → F7_t58 (new body)
    with BuildSketch(Plane.YZ.offset(-1.2333688147)):
        with BuildLine():
            ThreePointArc((-6.0723027314, 1.2866666667), (-5.8883350241, 1.5143267632), (-5.608454097, 1.6))
            Line((-5.608454097, 1.6), (-6.0018016229, 1.6))
            ThreePointArc((-6.0018016229, 1.6), (-6.024390983, 1.4404845199), (-6.0723027314, 1.2866666667))
        make_face()
    extrude(amount=F7_T58_DEPTH)

    split(bisect_by=Plane.YZ.offset(1.25), keep=Keep.TOP)


with BuildPart() as f1_14:
    add(f1_13.part)

    # F7_t55: cut F7_tool56
    add(f7_tool56.part, mode=Mode.SUBTRACT)


with BuildPart() as f7_tool61:
    # F7_s62 → F7_t63 (new body)
    with BuildSketch(Plane.YZ.offset(-2.7333688147)):
        with BuildLine():
            ThreePointArc((-6.0723027314, 1.2866666667), (-5.8883350241, 1.5143267632), (-5.608454097, 1.6))
            Line((-5.608454097, 1.6), (-6.0018016229, 1.6))
            ThreePointArc((-6.0018016229, 1.6), (-6.024390983, 1.4404845199), (-6.0723027314, 1.2866666667))
        make_face()
    extrude(amount=F7_T63_DEPTH)

    split(bisect_by=Plane.YZ.offset(-2.25), keep=Keep.BOTTOM)


with BuildPart() as f1_15:
    add(f1_14.part)

    # F7_t60: cut F7_tool61
    add(f7_tool61.part, mode=Mode.SUBTRACT)


with BuildPart() as f7_tool66:
    # F7_s67 → F7_t68 (new body)
    with BuildSketch(Plane.YZ.offset(-2.7333688147)):
        with BuildLine():
            ThreePointArc((-6.0723027314, 1.2866666667), (-5.8883350241, 1.5143267632), (-5.608454097, 1.6))
            Line((-5.608454097, 1.6), (-6.0018016229, 1.6))
            ThreePointArc((-6.0018016229, 1.6), (-6.024390983, 1.4404845199), (-6.0723027314, 1.2866666667))
        make_face()
    extrude(amount=F7_T68_DEPTH)

    split(bisect_by=Plane.YZ.offset(-0.25), keep=Keep.TOP)


with BuildPart() as f1_16:
    add(f1_15.part)

    # F7_t65: cut F7_tool66
    add(f7_tool66.part, mode=Mode.SUBTRACT)


with BuildPart() as f7_tool71:
    # F7_s72 → F7_t73 (new body)
    with BuildSketch(Plane.YZ.offset(-4.2333688147)):
        with BuildLine():
            ThreePointArc((-6.0723027314, 1.2866666667), (-5.8883350241, 1.5143267632), (-5.608454097, 1.6))
            Line((-5.608454097, 1.6), (-6.0018016229, 1.6))
            ThreePointArc((-6.0018016229, 1.6), (-6.024390983, 1.4404845199), (-6.0723027314, 1.2866666667))
        make_face()
    extrude(amount=F7_T73_DEPTH)

    split(bisect_by=Plane.YZ.offset(-1.75), keep=Keep.TOP)


with BuildPart() as f1_17:
    add(f1_16.part)

    # F7_t70: cut F7_tool71
    add(f7_tool71.part, mode=Mode.SUBTRACT)


solid = f1_17.part
